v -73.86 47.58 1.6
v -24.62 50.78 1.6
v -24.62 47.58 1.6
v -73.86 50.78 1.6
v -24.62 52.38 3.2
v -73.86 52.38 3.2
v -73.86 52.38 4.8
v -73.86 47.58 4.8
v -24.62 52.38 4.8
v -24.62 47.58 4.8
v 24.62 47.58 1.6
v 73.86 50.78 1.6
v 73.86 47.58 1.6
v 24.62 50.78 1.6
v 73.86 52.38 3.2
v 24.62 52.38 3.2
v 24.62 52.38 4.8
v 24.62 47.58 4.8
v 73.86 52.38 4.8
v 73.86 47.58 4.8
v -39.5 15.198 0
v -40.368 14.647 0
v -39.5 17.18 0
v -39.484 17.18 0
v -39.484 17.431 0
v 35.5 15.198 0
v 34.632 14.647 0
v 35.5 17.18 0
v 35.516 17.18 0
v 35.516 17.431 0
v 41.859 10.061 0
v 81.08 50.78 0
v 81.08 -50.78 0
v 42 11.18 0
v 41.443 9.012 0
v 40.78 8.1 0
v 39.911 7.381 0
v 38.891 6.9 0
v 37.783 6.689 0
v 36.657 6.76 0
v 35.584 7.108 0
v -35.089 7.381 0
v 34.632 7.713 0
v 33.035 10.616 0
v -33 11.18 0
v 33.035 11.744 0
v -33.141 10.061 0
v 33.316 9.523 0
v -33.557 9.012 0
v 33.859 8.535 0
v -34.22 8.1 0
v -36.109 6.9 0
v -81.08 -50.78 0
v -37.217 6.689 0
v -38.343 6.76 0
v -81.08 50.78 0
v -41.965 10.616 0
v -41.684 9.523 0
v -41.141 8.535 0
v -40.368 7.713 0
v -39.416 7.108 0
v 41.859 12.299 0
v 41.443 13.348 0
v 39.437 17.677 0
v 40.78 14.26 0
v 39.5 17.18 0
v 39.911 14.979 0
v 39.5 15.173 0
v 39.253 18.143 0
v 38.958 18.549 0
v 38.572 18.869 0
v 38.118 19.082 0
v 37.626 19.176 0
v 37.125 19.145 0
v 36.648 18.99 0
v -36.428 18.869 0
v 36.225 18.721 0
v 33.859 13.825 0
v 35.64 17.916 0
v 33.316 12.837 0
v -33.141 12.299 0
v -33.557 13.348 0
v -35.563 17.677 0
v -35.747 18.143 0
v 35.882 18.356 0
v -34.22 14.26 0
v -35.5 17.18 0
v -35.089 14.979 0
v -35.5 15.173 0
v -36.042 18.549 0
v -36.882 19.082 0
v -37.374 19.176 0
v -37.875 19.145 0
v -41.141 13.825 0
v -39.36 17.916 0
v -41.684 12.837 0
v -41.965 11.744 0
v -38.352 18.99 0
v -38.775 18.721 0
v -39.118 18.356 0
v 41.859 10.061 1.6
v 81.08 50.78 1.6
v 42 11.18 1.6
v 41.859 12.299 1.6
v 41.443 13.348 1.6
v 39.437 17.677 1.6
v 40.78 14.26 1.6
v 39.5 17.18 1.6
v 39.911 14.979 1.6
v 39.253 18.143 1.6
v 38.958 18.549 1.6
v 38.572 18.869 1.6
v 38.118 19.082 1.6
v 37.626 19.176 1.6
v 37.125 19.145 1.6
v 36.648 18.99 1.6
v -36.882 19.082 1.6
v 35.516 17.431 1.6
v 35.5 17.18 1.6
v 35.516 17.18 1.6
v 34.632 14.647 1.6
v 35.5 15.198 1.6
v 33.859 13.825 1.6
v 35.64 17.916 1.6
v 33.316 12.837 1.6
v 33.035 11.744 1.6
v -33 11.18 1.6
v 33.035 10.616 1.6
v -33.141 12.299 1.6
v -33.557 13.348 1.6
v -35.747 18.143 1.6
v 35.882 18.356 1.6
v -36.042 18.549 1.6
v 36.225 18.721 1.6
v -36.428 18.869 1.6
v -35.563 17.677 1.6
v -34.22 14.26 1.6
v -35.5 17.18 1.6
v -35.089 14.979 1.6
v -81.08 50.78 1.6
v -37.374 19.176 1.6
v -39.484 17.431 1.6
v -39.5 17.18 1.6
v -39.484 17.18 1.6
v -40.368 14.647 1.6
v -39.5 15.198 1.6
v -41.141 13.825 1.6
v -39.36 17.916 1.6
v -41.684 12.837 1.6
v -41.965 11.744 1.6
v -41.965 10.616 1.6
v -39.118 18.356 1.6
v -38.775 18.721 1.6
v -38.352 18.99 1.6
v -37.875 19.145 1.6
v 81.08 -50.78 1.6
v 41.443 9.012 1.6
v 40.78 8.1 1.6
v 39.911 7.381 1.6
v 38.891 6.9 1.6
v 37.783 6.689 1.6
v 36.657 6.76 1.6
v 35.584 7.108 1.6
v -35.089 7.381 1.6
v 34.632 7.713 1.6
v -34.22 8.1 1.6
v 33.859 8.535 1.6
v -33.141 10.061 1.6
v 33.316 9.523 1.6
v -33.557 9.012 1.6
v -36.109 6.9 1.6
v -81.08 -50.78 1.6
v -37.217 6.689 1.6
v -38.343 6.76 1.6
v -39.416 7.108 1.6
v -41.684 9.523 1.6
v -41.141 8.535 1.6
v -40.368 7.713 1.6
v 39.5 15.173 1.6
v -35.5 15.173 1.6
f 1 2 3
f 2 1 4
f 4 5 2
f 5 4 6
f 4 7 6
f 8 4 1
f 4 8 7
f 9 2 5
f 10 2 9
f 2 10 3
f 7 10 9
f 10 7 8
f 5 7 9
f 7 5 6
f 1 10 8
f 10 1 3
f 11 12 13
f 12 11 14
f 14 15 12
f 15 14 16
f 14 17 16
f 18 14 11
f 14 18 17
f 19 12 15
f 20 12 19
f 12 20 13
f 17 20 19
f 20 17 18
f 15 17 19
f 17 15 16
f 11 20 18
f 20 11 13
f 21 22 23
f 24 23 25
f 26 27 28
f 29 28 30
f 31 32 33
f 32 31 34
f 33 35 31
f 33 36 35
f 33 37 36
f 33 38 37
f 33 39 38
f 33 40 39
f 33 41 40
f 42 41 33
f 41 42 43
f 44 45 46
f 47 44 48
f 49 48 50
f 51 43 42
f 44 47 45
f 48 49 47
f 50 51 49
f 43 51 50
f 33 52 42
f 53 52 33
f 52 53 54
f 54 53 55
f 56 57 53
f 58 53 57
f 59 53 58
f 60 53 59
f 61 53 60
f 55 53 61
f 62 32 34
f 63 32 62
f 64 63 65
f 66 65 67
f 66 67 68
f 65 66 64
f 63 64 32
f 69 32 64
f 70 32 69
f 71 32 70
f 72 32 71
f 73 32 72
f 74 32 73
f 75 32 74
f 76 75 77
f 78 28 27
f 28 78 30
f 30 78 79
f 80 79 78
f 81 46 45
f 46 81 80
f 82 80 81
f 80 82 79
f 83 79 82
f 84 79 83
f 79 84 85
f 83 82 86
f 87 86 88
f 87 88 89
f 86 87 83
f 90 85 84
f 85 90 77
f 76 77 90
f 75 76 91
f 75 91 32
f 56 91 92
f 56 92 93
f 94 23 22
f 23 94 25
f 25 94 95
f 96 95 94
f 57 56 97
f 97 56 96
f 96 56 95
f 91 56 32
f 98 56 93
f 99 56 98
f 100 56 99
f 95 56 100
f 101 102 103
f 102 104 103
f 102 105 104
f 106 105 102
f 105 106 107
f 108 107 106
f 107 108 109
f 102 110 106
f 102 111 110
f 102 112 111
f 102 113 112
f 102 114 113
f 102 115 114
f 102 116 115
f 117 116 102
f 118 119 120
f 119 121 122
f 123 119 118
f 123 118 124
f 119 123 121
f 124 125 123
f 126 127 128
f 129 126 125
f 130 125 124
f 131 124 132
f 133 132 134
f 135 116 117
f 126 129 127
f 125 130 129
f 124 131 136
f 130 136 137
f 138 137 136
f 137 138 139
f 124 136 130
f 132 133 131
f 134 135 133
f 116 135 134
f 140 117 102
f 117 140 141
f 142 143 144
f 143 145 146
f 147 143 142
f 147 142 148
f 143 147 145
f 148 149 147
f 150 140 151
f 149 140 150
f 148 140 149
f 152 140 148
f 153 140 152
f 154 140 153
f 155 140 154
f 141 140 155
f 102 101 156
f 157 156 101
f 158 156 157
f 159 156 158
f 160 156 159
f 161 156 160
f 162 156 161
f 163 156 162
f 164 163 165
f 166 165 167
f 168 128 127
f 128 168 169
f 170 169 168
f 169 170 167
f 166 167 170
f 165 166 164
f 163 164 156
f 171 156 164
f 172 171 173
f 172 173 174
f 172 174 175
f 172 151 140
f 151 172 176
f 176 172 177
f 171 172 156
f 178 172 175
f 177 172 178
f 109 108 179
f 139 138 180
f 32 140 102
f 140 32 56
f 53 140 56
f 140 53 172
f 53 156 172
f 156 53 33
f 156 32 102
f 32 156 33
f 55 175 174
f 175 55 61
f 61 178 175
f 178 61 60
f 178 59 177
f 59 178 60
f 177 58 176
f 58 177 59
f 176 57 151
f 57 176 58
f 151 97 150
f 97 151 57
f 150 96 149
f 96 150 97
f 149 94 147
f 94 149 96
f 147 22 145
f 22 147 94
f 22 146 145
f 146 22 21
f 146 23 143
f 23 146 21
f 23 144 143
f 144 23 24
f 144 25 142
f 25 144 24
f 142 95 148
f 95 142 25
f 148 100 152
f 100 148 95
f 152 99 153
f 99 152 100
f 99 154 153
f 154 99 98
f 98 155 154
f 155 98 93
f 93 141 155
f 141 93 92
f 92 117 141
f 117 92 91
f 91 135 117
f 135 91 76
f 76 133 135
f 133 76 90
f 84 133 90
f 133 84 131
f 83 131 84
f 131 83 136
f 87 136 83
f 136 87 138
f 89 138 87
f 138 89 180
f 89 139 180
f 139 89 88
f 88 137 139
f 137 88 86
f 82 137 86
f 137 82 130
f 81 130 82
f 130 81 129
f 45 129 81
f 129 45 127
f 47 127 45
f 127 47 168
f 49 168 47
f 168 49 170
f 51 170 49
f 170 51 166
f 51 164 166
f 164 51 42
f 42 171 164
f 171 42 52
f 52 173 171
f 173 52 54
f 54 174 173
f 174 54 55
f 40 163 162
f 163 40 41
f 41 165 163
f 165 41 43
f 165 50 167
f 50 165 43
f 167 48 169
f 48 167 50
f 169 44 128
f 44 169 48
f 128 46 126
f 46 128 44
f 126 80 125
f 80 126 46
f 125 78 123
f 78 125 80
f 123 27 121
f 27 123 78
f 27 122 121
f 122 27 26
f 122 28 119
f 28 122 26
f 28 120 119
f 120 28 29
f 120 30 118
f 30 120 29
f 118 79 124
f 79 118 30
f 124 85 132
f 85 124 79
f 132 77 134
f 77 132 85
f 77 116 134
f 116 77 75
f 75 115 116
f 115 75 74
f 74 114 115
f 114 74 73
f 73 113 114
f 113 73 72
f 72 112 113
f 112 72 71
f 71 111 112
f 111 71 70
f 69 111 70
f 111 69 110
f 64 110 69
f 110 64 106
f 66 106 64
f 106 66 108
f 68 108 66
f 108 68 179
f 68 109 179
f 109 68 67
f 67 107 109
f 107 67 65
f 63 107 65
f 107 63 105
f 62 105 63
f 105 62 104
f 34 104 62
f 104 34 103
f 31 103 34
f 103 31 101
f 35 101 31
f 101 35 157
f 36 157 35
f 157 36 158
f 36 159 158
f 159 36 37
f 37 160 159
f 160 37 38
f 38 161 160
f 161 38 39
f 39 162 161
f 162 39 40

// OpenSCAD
// file: RPiModules.scad
//Version 8
include <RPiDims.scad>;

$fn=25;
//returns a vector of the center of the circle at each corner 
//of a rounded square in the x-y plane
function corner_vectors(width, breadth, radius = 0) = 
    [
        [radius-width/2,radius-breadth/2,0],
        [width/2-radius,radius-breadth/2,0],
        [radius-width/2,breadth/2-radius,0],
        [width/2-radius,breadth/2-radius,0]];

module rounded_square(width,breadth,radius) {
    union() {
        square(size=[width-2*radius,breadth],center=true);
        square(size=[width,breadth-2*radius],center=true);
        
        for(cv = corner_vectors(width,breadth,radius)) {
            translate(v=cv) {
                circle(r=radius);
            }
        }
    }
}

module rounded_box_sides(width,breadth,radius,height,thickness) {
    linear_extrude(height=height) {
        difference() {
            rounded_square(width,breadth,radius);
            rounded_square(width-2*thickness,breadth-2*thickness,radius-thickness);
        }
    }
}

module key_hole(d1,d2,dist) {
    circle(d=d1);
    translate(v=[0,-1*dist,0]) {
        circle(d=d2);
    }
    translate(v=[0,-0.5*dist,0]) {
        square(size=[d1,dist], center=true);
    }
}

module rounded_square_triag_ring(width,breadth,radius,height,thickness) {
    difference() {
        rounded_box_sides(width,breadth,radius,height,thickness);
        linear_extrude(height=height,scale=[1-2*thickness/width,1-2*thickness/breadth]) {
            rounded_square(width,breadth,radius);
        }
    }
}

module rpi_wall_mount(remove_center_square = true, print_holes = true) {

    //Wall mount plates
    difference() {
        linear_extrude(height=thickness) {
            difference() {
                rounded_square(width,breadth,corner_radius+thickness);
                if (remove_center_square) {
                    square(size=[width-2*mount_plate_width,breadth-8*thickness],center=true);
                }
            }
        }
        if (print_holes) {
            translate(v=[0,hdist/2,0]) {
                linear_extrude(height=thickness) {
                    for (cv = corner_vectors(width,breadth-hdist,corner_radius+thickness)) {
                        translate(v=cv) {
                            key_hole(hd1,hd2,hdist);
                        }
                    }
                }
            }
        }
    }

}

module rpi_case(print_holes = true)
{
    difference() {
        //Rounded sides
        union() {
            rounded_box_sides(width,breadth,corner_radius+thickness,height,thickness);
            for (i=[-1,1]) {
                translate([i*(width-mount_plate_width)/2,0,cable_hole_height/2+thickness]) {
                    //Cable hole boxes (left/right)
                    cube(size=[mount_plate_width,cable_hole_width+2*thickness,cable_hole_height+2*thickness],center=true);
                    for (j=[-1,1]) {
                        translate([0,j*(breadth-1.5*mount_plate_width)/2,-cable_hole_height/2-thickness]) {
                            rounded_box_sides(mount_plate_width,1.5*mount_plate_width,corner_radius+thickness,cable_hole_height+2*thickness,thickness);
                        }
                    }
                }
                translate([0,i*(breadth-4*thickness)/2,cable_hole_height/2+thickness]) {
                    //Cable hole boxes (top/bottom)
                    cube(size=[cable_hole_width+2*thickness,4*thickness,cable_hole_height+2*thickness],center=true);
                }
            }
        }
        //Ventilation grille
        translate (v=[-0.5*grille_dist*(grille_count-1),thickness-breadth/2,0.15*height]) {
            rotate(a = 90,v=[1,0,0]) {
                for (i = [0:grille_count-1]) {
                    translate (v=[i*grille_dist,4*grille_width,-breadth]) {
                        //Ventilation grille
                        linear_extrude(height=breadth+2*thickness, twist=0, center=false) {
                            union() {
                                circle(d=grille_width);
                                translate(v=[-0.5*grille_width,0,0]) {
                                    square(size=[grille_width,0.4*height]);
                                }
                                translate(v=[0,0.4*height,0]) {
                                    circle(d=grille_width);
                                }
                            }
                        }
                    }
                }
            }
        }
        //Cable holes
        for (i=[-1,1]) {
            translate([i*(width-mount_plate_width)/2,0,cable_hole_height/2+thickness]) {
                cube(size=[mount_plate_width-thickness,cable_hole_width,cable_hole_height], center=true);
            }
            translate([0,i*(breadth-4*thickness)/2,cable_hole_height/2+thickness]) {
                //Cable hole boxes (top/bottom)
                cube(size=[cable_hole_width,3*thickness,cable_hole_height],center=true);
            }
        }
    }

    rpi_wall_mount();

    //Screen mount support rims
    translate(v=[0,0,height-screen_thickness_at_mounts]) {
        rounded_box_sides(width-2*thickness,breadth-2*thickness,corner_radius,screen_thickness_at_mounts-screen_edge_thickness,2*thickness);
        translate(v=[0,0,-2*thickness]) {
            difference() {
                rounded_square_triag_ring(width-2*thickness,breadth-2*thickness,corner_radius,2*thickness,2*thickness);
                for (i=[-1,1]) {
                    translate(v=[i*screen_mount_dist_x*0.5+screen_mount_offset_x,0,thickness]) {
                        cube([7*screen_mount_hole_diameter,breadth-2*thickness,2*thickness], true);
                    }
                }
            }
        }
    }
}

module rpi_screen_mount_plates() {
    //Screen mount plates
    rotate(90) {
        for (i=[-1,1]) {
            translate([i*4*screen_mount_hole_diameter,0,thickness]) {
                difference() {
                    cube([5*screen_mount_hole_diameter,breadth-2*thickness,2*thickness], true);
                    for (i=[-1,1]) {
                        translate([0,i*screen_mount_dist_y/2+screen_mount_offset_y,0]) {
                            for (j=[-1,1]) {
                                translate([0,j*screen_mount_hole_diameter/2,0]) {
                                    cylinder(d=screen_mount_hole_diameter,h=2*thickness,center=true);
                                }
                            }
                            cube([screen_mount_hole_diameter,screen_mount_hole_diameter,2*thickness],true);
                        }
                    }
                }
            }
        }
    }
}

module rpt_mount_plate() {
    linear_extrude(height=thickness) {
        difference() {
            square(size=[width-2*mount_plate_width-2*lth,breadth-8*thickness-2*lth],center=true);
            for (i=[-1,1]) {
                translate(v=[i*75/2,breadth/2-40-lth]) {
                    key_hole(hd1,hd2,hdist);
                }
            }

        }
    }
    for (i=[-1,1]) {
        translate(v=[i*width/4,(breadth-8*thickness)/2-thickness-lth,thickness]) {
            intersection() {
                linear_extrude(height=thickness, scale=2) {
                    square([width/4,2*thickness], center=true);
                }
                translate([0,thickness,0]) {
                    linear_extrude(height=thickness) {
                        square([width/4,2*thickness], center=true);
                    }
                }
            }
            translate([0,thickness,thickness]) {
                linear_extrude(height=thickness) {
                    square([width/4,2*thickness], center=true);
                }
            }
                linear_extrude(height=2*thickness) {
                    square([width/4,2*thickness], center=true);
                }

        }
    }
}
// file: RPiDims.scad
thickness=1.6;                                        //Thickness of case walls
lth=0.2;                                              //Layer thickness
width=192.96+2.5*thickness;                           //Width of case (x dim)
breadth=110.76+2.5*thickness;                         //Breadth of case (y dim)
height=55;                                            //Height of case (z dim)
corner_radius=7;                                      //Radius of screen corners
hd1=4;                                                //Mount key hole diameter 1
hd2=9;                                                //Mount key hole diameter 2
hdist=6;                                              //Mount key hole distance
mount_plate_width=2*(corner_radius+thickness);        //Mount plate width
screen_edge_thickness=0.8;                            //Screen edge thickness 
screen_thickness_at_mounts=8.5;                       //Screen thickness at mounts
screen_mount_hole_diameter=3.5;                       //Screen mount hole diameter
screen_mount_plate_width=3*screen_mount_hole_diameter;//Screen mount plate width
screen_mount_dist_x=125.46;                           //Distance between screen mount holes in x direction
screen_mount_dist_y=65.8;                             //Distance between screen mount holes in y direction
screen_mount_offset_x=1.05;                           //Screen mount holes offset from center in x direction
screen_mount_offset_y=0.5;                            //Screen mount holes offset from center in y direction
grille_width=1.5*thickness;                           //Width of each ventilation grille
grille_dist=6*thickness;                              //Distance between ventilation grilles
grille_count=12;                                      //Number of ventilation grilles
cable_hole_height = 10;                               //
cable_hole_width=12;                                  //
// main file
include <RPiDims.scad>
use <RPiModules.scad>

rpt_mount_plate();
